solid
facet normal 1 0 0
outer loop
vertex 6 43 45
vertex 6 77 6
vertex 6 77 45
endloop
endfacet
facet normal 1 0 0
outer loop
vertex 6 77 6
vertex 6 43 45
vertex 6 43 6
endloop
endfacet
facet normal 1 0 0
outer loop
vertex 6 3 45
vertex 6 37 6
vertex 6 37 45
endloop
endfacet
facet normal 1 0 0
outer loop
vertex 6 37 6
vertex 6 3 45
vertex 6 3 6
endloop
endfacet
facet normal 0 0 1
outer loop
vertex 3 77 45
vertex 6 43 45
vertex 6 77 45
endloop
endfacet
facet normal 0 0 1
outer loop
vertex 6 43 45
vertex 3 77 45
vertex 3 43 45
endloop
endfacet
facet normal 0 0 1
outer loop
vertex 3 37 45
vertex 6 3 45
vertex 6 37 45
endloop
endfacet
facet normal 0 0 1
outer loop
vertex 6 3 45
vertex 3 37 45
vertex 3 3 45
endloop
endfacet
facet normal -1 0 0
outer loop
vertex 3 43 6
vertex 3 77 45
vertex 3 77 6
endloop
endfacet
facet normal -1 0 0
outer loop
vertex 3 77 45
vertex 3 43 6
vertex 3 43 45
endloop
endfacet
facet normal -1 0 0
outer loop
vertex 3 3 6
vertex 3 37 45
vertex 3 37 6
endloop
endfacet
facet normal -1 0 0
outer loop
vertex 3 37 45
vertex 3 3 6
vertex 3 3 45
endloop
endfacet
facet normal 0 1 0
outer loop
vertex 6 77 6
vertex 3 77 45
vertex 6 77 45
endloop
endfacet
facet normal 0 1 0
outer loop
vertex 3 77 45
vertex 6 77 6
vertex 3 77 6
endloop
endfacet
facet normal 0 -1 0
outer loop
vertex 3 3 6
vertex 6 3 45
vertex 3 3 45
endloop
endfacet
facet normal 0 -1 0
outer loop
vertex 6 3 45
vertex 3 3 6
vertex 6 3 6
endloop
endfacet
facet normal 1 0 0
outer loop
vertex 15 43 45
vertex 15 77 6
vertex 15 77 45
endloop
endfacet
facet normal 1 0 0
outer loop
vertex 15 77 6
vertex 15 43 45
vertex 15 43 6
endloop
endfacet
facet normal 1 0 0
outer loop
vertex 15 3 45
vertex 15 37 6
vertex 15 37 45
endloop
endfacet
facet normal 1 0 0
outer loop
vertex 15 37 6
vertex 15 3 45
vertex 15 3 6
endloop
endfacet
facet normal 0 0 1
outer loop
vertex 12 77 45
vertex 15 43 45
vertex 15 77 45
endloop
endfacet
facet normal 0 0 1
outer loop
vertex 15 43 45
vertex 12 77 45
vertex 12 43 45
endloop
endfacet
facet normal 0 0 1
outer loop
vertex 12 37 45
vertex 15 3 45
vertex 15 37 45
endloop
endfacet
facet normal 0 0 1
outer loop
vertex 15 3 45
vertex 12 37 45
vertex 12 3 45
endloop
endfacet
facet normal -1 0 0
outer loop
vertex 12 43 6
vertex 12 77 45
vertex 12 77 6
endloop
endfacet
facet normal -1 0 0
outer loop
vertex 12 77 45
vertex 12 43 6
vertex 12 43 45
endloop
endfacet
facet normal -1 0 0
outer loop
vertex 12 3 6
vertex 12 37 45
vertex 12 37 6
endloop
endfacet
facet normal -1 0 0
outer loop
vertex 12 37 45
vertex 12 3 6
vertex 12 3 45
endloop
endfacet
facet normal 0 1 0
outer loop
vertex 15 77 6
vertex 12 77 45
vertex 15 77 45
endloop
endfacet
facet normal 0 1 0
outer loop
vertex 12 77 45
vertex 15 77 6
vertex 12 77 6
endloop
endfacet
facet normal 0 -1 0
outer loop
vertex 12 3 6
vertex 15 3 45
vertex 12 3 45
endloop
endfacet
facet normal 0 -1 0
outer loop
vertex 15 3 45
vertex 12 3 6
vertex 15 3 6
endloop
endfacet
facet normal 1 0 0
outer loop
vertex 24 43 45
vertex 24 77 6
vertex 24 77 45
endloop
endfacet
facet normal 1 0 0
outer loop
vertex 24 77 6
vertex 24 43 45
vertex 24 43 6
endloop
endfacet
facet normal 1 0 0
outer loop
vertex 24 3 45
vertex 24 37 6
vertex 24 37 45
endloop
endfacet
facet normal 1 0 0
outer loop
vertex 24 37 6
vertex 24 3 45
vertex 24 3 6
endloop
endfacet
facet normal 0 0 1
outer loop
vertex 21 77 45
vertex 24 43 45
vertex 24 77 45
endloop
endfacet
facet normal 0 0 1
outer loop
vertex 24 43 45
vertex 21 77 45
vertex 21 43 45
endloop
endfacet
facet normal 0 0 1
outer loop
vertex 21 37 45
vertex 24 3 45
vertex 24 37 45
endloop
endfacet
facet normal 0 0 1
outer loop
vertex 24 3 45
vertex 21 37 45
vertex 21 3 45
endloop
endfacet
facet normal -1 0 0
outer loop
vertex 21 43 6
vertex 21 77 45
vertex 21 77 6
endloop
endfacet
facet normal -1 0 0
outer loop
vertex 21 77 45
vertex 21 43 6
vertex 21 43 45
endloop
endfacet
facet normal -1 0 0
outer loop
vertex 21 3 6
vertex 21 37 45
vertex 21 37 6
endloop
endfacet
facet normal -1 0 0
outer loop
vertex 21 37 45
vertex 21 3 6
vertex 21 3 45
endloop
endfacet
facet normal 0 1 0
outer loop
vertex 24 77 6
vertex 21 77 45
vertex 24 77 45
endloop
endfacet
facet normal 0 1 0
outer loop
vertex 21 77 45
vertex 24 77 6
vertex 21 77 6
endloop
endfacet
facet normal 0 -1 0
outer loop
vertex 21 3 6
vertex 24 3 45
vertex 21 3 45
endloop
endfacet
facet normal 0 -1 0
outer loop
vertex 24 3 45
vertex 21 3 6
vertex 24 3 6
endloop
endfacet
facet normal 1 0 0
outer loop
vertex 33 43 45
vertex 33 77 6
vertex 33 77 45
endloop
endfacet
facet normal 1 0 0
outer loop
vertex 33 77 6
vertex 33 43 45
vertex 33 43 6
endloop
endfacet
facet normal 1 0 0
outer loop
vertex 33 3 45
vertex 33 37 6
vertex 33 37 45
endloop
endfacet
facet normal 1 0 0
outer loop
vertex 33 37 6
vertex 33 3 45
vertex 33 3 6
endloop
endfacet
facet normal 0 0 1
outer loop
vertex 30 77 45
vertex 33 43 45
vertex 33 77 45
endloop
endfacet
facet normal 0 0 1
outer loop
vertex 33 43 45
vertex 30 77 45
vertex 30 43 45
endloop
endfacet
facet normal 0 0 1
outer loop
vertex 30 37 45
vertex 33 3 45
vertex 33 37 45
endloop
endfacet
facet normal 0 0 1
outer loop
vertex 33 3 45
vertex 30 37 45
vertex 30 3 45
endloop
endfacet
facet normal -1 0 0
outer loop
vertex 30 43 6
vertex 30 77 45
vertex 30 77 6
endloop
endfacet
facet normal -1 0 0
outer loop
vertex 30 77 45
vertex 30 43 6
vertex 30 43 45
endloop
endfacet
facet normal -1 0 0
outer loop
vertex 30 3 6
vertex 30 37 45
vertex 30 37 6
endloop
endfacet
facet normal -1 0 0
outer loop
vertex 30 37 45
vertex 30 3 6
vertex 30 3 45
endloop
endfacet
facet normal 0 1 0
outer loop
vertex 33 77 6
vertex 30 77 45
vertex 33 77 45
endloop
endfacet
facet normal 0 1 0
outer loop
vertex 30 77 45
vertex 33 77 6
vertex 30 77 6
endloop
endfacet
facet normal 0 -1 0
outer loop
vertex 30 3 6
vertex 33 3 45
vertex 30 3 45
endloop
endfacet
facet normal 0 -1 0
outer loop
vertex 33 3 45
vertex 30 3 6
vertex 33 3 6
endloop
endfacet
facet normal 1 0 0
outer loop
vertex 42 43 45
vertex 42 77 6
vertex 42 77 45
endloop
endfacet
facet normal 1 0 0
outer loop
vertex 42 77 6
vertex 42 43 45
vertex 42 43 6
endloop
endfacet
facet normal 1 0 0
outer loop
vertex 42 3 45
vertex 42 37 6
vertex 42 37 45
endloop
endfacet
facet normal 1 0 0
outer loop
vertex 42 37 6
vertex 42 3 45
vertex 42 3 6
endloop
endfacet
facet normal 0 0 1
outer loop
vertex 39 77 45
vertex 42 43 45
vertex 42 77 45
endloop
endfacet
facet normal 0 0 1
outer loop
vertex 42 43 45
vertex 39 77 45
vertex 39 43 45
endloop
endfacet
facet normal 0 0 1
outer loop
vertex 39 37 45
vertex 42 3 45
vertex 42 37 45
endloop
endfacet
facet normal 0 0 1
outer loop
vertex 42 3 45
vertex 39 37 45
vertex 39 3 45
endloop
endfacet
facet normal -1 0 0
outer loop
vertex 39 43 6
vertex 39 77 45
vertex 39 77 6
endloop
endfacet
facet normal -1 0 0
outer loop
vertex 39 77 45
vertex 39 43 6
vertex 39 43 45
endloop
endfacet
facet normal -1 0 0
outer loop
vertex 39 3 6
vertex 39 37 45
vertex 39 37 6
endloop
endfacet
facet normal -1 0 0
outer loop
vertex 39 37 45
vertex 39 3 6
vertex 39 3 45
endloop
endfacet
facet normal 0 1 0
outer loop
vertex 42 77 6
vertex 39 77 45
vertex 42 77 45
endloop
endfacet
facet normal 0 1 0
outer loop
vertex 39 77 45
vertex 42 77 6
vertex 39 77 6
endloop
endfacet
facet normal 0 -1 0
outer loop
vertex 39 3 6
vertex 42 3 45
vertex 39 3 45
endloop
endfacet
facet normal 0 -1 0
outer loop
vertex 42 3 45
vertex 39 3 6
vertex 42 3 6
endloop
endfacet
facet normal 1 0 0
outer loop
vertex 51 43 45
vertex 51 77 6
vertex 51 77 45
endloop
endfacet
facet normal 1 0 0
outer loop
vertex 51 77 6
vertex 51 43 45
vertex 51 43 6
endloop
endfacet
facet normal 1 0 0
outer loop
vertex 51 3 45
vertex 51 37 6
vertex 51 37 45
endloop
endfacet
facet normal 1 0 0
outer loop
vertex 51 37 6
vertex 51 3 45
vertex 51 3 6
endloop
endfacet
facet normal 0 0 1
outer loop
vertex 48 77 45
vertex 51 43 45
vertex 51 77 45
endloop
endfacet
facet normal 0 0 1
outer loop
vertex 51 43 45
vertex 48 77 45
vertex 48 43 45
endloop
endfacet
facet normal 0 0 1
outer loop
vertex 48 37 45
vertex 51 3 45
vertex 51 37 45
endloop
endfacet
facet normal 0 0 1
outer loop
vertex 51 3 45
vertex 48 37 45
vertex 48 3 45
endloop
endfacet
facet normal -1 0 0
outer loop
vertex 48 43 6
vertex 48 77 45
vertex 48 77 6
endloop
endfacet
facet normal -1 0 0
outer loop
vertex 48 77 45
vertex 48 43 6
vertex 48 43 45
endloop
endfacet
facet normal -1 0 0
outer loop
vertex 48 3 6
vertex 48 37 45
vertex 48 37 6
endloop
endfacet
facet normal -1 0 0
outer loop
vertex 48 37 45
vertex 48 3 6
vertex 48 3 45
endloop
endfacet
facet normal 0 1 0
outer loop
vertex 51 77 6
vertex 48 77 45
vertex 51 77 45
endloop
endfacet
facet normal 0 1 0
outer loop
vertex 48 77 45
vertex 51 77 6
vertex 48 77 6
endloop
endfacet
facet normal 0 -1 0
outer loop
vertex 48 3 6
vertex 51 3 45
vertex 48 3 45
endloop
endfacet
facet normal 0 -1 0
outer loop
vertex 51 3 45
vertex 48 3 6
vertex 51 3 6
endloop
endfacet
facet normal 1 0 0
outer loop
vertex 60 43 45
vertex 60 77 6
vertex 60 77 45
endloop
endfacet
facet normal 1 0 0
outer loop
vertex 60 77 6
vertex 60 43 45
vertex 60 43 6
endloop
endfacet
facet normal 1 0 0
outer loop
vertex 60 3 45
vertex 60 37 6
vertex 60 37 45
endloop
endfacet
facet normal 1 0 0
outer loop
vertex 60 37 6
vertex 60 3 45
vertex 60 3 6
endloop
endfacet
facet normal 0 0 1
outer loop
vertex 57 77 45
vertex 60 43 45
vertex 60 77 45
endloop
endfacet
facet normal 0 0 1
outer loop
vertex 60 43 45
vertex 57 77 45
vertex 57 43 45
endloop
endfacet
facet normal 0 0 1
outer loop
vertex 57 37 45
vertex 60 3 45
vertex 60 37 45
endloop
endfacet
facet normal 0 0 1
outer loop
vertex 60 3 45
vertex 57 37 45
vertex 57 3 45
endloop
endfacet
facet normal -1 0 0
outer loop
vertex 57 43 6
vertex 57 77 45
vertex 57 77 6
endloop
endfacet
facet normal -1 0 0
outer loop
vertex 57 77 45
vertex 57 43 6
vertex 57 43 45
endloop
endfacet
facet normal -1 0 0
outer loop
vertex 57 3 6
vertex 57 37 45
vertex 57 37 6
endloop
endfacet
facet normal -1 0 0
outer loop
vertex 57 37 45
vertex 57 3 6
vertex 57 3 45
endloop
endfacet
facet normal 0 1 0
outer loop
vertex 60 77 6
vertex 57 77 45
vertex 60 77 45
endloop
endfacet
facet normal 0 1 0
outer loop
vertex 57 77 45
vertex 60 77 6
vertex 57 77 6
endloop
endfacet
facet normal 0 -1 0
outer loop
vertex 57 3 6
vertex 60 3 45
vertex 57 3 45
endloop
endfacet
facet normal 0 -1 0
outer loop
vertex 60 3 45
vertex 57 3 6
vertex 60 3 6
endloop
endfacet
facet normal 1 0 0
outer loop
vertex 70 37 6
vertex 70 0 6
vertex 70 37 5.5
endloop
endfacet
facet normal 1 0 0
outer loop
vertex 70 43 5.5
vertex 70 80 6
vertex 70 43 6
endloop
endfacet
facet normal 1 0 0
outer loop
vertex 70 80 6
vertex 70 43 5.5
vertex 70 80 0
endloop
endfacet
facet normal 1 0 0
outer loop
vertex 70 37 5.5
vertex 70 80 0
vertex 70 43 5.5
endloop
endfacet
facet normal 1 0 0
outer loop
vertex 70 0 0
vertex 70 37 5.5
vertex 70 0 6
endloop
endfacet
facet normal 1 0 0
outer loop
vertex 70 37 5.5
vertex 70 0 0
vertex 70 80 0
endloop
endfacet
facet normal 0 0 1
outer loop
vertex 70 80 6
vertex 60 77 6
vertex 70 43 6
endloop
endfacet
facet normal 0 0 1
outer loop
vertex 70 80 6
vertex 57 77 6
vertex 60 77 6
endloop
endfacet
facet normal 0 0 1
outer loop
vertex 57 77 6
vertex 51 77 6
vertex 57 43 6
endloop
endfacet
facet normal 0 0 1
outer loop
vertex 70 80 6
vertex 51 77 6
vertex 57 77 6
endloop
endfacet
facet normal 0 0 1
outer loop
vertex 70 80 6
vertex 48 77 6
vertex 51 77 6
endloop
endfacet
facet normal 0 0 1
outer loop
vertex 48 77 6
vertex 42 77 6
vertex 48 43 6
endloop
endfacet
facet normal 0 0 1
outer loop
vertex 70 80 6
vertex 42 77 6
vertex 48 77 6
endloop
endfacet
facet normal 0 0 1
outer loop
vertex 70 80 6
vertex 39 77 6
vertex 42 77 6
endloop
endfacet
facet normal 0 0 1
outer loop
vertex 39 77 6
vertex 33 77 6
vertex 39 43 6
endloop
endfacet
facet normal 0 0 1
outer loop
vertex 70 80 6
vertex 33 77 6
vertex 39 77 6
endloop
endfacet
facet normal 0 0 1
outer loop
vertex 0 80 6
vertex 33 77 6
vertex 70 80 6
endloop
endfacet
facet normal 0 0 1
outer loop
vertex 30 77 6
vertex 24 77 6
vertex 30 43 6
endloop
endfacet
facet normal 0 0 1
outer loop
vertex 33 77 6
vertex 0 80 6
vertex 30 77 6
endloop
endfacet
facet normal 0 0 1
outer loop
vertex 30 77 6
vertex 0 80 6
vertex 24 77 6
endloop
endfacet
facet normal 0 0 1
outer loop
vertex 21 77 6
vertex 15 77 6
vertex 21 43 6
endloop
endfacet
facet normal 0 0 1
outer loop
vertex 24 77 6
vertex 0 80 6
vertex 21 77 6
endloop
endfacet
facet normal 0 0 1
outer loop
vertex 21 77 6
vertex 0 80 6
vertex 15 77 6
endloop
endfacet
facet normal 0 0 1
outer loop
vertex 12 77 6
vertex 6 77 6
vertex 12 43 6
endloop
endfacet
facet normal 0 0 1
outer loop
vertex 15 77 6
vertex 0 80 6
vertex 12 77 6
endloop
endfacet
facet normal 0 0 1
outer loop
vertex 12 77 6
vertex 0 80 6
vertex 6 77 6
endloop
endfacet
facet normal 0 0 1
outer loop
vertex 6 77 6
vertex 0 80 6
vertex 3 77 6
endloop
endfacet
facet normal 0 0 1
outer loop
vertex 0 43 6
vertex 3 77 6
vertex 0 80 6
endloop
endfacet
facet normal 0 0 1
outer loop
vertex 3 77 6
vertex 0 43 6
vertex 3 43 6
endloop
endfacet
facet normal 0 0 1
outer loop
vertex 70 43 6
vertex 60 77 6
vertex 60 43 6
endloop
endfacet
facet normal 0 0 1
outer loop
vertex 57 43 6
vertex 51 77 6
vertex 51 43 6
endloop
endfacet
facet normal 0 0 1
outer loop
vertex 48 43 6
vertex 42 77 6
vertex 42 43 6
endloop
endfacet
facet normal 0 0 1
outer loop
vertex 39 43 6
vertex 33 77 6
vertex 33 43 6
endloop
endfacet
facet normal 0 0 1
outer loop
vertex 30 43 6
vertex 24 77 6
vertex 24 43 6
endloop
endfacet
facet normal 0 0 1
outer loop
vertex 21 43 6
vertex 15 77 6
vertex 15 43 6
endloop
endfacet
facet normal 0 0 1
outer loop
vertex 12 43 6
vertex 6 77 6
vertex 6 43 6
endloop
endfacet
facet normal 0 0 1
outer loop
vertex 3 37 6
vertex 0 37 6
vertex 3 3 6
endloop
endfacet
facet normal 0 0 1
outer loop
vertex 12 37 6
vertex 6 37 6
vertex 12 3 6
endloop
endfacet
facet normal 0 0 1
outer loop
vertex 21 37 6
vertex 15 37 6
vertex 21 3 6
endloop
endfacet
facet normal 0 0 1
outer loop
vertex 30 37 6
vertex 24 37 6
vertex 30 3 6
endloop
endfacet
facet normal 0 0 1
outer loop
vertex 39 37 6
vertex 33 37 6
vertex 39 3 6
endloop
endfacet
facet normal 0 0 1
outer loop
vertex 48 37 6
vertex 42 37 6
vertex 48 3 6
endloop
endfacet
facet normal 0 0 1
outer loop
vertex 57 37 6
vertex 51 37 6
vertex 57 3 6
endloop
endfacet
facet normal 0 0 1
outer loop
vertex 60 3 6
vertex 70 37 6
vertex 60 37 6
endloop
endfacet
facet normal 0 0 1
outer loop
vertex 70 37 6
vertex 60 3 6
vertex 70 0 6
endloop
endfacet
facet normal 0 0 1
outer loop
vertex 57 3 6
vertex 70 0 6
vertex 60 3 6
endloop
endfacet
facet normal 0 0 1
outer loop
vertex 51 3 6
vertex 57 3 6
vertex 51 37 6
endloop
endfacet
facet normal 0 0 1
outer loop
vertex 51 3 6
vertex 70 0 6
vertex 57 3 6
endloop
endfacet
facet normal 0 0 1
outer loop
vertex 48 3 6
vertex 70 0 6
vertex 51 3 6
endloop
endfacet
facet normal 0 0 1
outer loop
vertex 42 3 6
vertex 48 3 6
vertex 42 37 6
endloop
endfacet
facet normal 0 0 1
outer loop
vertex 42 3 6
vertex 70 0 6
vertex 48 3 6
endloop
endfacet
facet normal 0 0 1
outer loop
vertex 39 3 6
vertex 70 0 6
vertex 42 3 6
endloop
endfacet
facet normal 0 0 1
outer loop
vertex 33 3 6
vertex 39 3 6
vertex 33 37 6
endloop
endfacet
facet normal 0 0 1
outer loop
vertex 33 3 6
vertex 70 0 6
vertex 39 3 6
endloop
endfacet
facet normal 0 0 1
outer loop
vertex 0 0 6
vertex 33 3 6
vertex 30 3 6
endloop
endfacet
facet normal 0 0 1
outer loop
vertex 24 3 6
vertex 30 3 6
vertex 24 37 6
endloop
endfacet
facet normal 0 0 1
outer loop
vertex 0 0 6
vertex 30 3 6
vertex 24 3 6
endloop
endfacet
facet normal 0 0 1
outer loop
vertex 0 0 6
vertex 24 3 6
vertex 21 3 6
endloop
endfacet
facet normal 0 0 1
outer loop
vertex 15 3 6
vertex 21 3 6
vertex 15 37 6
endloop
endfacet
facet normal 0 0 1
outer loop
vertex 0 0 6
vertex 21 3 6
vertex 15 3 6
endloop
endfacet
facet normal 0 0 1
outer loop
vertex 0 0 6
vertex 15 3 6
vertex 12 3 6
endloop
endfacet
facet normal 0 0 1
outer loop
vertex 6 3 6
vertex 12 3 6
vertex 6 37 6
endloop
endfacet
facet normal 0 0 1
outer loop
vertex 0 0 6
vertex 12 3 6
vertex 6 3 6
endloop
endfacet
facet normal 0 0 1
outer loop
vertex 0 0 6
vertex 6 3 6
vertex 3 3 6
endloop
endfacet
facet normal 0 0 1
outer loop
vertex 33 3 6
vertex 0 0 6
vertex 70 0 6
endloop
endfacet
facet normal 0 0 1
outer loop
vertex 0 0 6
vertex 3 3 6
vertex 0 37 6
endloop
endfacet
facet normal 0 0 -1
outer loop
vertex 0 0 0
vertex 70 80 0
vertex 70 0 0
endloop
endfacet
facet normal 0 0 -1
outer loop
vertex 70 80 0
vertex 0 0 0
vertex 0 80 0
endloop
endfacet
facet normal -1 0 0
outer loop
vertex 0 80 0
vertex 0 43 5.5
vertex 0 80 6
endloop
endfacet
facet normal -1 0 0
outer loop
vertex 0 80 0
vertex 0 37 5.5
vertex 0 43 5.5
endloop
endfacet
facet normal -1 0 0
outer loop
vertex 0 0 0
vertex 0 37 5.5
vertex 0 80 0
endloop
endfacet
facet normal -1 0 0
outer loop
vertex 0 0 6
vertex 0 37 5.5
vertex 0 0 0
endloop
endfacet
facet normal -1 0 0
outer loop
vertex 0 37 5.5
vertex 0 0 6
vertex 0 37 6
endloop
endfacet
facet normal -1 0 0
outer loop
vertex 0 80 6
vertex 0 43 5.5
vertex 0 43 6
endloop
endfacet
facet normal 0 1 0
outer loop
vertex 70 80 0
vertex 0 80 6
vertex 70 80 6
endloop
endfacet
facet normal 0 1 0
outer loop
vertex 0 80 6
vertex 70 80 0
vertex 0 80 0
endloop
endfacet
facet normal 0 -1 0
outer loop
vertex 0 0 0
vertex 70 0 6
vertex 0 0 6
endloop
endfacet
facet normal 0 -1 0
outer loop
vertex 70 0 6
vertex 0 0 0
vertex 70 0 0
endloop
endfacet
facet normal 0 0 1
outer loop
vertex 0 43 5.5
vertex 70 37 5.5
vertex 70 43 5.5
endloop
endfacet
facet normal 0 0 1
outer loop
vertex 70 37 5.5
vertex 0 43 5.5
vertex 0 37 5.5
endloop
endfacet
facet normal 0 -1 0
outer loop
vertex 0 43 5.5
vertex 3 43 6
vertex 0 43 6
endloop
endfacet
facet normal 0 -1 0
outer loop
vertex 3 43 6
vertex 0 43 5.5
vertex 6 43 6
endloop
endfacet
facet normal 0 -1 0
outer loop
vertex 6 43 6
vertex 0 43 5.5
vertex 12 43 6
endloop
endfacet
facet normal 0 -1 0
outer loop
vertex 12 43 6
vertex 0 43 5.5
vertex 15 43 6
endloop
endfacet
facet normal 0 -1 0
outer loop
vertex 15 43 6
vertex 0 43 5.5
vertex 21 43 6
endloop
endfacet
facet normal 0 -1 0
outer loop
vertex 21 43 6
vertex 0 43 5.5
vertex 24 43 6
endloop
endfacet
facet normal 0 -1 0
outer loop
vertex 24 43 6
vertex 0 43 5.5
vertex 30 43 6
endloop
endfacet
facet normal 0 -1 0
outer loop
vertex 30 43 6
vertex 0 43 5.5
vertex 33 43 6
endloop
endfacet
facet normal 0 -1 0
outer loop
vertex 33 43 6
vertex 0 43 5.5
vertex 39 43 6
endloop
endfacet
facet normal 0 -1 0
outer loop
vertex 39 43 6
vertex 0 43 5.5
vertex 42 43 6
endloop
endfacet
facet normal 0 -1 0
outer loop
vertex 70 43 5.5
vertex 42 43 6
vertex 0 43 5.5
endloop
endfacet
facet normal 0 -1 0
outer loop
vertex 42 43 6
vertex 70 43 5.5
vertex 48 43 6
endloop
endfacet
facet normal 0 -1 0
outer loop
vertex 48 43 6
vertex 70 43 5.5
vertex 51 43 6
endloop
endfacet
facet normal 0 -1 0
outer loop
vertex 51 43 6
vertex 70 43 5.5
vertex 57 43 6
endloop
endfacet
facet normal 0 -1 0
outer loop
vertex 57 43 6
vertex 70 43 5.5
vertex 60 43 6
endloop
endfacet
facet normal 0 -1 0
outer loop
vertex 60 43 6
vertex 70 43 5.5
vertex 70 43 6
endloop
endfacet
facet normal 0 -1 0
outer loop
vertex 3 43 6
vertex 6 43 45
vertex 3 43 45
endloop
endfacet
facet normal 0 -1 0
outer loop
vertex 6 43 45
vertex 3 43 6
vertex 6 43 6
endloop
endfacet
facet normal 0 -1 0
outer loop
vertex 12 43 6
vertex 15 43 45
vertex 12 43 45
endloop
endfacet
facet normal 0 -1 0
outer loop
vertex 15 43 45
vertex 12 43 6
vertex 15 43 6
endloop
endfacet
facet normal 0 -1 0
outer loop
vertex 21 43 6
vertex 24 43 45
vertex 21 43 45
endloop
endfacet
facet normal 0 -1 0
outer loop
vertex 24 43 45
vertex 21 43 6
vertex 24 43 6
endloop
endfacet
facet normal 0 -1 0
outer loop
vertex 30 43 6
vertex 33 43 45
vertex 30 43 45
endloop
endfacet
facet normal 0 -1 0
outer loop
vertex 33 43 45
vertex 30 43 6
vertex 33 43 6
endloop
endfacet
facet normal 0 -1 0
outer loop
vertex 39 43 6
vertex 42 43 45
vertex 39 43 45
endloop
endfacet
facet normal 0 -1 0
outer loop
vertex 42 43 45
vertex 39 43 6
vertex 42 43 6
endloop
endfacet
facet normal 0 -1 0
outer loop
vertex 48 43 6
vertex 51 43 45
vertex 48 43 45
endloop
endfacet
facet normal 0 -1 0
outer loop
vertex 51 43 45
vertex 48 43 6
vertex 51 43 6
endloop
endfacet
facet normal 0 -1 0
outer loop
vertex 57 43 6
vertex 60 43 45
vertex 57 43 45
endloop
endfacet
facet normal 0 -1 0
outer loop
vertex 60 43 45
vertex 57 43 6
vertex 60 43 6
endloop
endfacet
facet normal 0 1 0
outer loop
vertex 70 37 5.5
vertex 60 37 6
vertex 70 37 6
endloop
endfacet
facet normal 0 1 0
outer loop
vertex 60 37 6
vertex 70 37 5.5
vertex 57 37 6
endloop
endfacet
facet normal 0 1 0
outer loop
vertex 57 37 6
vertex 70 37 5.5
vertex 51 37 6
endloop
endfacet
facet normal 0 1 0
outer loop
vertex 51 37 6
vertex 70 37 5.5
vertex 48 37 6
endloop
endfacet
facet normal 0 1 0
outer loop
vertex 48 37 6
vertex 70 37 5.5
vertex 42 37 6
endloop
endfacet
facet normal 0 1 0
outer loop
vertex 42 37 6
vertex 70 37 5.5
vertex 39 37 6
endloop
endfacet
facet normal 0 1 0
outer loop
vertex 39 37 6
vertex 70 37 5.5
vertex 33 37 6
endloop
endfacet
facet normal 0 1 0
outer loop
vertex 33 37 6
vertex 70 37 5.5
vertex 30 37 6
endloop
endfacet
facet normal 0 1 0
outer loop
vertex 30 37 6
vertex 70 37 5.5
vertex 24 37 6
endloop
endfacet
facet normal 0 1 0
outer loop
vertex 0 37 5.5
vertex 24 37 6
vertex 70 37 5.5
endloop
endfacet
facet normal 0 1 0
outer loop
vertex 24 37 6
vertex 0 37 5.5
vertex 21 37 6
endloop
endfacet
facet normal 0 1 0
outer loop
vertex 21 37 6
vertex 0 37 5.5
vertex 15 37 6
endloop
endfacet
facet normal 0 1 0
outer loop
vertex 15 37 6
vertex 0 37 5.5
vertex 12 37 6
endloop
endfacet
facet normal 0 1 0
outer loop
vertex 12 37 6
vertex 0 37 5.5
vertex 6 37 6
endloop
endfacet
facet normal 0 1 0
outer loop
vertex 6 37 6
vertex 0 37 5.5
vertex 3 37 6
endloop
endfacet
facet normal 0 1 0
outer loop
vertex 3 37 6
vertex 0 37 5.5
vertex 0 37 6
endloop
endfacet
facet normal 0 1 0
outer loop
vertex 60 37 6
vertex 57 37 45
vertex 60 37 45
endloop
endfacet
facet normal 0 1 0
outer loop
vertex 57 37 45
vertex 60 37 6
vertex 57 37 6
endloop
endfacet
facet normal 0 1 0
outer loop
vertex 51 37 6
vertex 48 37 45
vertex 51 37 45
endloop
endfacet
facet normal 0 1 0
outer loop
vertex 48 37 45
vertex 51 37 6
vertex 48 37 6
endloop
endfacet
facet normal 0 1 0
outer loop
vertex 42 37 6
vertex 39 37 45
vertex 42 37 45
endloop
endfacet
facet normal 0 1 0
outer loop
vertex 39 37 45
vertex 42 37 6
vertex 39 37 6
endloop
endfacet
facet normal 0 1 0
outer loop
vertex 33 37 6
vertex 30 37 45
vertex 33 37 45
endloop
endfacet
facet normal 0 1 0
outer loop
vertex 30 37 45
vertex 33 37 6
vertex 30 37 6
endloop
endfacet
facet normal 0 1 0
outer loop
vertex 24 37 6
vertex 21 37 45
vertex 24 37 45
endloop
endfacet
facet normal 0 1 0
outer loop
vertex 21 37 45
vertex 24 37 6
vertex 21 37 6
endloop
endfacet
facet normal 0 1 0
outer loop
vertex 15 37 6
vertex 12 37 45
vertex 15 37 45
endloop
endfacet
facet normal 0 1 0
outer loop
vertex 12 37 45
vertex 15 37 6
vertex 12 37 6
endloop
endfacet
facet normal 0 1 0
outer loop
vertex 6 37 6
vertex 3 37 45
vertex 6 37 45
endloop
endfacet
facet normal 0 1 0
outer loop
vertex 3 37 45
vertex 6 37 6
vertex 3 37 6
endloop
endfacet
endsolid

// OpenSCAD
$fn = 32;

// ----------------------------------------------------------------------
// Heatsink: slotted fin block
// ----------------------------------------------------------------------

// --- parameters (mm) ---
base_l = 70;              // base length, X
base_w = 80;              // base width, Y
base_t = 6;               // base plate thickness
fin_h = 40;               // fin height above the base
fin_t = 3;                // fin thickness
edge = 3;                 // margin from the base ends
pitch = 9;                // fin pitch
slot_w = 6;               // central slot width, Y

n_fins = floor((base_l - 2 * edge - fin_t) / pitch) + 1;  // fin count
total_h = base_t + fin_h - 1;  // overall height

difference() {
union() {
  cube([base_l, base_w, base_t]);
  for (i = [0 : n_fins - 1])
    translate([edge + i * pitch, edge, base_t - 1])
      cube([fin_t, base_w - 2 * edge, fin_h]);
}
  translate([-1, base_w / 2 - slot_w / 2, base_t - 0.5])
    cube([base_l + 2, slot_w, fin_h + 2]);
}
